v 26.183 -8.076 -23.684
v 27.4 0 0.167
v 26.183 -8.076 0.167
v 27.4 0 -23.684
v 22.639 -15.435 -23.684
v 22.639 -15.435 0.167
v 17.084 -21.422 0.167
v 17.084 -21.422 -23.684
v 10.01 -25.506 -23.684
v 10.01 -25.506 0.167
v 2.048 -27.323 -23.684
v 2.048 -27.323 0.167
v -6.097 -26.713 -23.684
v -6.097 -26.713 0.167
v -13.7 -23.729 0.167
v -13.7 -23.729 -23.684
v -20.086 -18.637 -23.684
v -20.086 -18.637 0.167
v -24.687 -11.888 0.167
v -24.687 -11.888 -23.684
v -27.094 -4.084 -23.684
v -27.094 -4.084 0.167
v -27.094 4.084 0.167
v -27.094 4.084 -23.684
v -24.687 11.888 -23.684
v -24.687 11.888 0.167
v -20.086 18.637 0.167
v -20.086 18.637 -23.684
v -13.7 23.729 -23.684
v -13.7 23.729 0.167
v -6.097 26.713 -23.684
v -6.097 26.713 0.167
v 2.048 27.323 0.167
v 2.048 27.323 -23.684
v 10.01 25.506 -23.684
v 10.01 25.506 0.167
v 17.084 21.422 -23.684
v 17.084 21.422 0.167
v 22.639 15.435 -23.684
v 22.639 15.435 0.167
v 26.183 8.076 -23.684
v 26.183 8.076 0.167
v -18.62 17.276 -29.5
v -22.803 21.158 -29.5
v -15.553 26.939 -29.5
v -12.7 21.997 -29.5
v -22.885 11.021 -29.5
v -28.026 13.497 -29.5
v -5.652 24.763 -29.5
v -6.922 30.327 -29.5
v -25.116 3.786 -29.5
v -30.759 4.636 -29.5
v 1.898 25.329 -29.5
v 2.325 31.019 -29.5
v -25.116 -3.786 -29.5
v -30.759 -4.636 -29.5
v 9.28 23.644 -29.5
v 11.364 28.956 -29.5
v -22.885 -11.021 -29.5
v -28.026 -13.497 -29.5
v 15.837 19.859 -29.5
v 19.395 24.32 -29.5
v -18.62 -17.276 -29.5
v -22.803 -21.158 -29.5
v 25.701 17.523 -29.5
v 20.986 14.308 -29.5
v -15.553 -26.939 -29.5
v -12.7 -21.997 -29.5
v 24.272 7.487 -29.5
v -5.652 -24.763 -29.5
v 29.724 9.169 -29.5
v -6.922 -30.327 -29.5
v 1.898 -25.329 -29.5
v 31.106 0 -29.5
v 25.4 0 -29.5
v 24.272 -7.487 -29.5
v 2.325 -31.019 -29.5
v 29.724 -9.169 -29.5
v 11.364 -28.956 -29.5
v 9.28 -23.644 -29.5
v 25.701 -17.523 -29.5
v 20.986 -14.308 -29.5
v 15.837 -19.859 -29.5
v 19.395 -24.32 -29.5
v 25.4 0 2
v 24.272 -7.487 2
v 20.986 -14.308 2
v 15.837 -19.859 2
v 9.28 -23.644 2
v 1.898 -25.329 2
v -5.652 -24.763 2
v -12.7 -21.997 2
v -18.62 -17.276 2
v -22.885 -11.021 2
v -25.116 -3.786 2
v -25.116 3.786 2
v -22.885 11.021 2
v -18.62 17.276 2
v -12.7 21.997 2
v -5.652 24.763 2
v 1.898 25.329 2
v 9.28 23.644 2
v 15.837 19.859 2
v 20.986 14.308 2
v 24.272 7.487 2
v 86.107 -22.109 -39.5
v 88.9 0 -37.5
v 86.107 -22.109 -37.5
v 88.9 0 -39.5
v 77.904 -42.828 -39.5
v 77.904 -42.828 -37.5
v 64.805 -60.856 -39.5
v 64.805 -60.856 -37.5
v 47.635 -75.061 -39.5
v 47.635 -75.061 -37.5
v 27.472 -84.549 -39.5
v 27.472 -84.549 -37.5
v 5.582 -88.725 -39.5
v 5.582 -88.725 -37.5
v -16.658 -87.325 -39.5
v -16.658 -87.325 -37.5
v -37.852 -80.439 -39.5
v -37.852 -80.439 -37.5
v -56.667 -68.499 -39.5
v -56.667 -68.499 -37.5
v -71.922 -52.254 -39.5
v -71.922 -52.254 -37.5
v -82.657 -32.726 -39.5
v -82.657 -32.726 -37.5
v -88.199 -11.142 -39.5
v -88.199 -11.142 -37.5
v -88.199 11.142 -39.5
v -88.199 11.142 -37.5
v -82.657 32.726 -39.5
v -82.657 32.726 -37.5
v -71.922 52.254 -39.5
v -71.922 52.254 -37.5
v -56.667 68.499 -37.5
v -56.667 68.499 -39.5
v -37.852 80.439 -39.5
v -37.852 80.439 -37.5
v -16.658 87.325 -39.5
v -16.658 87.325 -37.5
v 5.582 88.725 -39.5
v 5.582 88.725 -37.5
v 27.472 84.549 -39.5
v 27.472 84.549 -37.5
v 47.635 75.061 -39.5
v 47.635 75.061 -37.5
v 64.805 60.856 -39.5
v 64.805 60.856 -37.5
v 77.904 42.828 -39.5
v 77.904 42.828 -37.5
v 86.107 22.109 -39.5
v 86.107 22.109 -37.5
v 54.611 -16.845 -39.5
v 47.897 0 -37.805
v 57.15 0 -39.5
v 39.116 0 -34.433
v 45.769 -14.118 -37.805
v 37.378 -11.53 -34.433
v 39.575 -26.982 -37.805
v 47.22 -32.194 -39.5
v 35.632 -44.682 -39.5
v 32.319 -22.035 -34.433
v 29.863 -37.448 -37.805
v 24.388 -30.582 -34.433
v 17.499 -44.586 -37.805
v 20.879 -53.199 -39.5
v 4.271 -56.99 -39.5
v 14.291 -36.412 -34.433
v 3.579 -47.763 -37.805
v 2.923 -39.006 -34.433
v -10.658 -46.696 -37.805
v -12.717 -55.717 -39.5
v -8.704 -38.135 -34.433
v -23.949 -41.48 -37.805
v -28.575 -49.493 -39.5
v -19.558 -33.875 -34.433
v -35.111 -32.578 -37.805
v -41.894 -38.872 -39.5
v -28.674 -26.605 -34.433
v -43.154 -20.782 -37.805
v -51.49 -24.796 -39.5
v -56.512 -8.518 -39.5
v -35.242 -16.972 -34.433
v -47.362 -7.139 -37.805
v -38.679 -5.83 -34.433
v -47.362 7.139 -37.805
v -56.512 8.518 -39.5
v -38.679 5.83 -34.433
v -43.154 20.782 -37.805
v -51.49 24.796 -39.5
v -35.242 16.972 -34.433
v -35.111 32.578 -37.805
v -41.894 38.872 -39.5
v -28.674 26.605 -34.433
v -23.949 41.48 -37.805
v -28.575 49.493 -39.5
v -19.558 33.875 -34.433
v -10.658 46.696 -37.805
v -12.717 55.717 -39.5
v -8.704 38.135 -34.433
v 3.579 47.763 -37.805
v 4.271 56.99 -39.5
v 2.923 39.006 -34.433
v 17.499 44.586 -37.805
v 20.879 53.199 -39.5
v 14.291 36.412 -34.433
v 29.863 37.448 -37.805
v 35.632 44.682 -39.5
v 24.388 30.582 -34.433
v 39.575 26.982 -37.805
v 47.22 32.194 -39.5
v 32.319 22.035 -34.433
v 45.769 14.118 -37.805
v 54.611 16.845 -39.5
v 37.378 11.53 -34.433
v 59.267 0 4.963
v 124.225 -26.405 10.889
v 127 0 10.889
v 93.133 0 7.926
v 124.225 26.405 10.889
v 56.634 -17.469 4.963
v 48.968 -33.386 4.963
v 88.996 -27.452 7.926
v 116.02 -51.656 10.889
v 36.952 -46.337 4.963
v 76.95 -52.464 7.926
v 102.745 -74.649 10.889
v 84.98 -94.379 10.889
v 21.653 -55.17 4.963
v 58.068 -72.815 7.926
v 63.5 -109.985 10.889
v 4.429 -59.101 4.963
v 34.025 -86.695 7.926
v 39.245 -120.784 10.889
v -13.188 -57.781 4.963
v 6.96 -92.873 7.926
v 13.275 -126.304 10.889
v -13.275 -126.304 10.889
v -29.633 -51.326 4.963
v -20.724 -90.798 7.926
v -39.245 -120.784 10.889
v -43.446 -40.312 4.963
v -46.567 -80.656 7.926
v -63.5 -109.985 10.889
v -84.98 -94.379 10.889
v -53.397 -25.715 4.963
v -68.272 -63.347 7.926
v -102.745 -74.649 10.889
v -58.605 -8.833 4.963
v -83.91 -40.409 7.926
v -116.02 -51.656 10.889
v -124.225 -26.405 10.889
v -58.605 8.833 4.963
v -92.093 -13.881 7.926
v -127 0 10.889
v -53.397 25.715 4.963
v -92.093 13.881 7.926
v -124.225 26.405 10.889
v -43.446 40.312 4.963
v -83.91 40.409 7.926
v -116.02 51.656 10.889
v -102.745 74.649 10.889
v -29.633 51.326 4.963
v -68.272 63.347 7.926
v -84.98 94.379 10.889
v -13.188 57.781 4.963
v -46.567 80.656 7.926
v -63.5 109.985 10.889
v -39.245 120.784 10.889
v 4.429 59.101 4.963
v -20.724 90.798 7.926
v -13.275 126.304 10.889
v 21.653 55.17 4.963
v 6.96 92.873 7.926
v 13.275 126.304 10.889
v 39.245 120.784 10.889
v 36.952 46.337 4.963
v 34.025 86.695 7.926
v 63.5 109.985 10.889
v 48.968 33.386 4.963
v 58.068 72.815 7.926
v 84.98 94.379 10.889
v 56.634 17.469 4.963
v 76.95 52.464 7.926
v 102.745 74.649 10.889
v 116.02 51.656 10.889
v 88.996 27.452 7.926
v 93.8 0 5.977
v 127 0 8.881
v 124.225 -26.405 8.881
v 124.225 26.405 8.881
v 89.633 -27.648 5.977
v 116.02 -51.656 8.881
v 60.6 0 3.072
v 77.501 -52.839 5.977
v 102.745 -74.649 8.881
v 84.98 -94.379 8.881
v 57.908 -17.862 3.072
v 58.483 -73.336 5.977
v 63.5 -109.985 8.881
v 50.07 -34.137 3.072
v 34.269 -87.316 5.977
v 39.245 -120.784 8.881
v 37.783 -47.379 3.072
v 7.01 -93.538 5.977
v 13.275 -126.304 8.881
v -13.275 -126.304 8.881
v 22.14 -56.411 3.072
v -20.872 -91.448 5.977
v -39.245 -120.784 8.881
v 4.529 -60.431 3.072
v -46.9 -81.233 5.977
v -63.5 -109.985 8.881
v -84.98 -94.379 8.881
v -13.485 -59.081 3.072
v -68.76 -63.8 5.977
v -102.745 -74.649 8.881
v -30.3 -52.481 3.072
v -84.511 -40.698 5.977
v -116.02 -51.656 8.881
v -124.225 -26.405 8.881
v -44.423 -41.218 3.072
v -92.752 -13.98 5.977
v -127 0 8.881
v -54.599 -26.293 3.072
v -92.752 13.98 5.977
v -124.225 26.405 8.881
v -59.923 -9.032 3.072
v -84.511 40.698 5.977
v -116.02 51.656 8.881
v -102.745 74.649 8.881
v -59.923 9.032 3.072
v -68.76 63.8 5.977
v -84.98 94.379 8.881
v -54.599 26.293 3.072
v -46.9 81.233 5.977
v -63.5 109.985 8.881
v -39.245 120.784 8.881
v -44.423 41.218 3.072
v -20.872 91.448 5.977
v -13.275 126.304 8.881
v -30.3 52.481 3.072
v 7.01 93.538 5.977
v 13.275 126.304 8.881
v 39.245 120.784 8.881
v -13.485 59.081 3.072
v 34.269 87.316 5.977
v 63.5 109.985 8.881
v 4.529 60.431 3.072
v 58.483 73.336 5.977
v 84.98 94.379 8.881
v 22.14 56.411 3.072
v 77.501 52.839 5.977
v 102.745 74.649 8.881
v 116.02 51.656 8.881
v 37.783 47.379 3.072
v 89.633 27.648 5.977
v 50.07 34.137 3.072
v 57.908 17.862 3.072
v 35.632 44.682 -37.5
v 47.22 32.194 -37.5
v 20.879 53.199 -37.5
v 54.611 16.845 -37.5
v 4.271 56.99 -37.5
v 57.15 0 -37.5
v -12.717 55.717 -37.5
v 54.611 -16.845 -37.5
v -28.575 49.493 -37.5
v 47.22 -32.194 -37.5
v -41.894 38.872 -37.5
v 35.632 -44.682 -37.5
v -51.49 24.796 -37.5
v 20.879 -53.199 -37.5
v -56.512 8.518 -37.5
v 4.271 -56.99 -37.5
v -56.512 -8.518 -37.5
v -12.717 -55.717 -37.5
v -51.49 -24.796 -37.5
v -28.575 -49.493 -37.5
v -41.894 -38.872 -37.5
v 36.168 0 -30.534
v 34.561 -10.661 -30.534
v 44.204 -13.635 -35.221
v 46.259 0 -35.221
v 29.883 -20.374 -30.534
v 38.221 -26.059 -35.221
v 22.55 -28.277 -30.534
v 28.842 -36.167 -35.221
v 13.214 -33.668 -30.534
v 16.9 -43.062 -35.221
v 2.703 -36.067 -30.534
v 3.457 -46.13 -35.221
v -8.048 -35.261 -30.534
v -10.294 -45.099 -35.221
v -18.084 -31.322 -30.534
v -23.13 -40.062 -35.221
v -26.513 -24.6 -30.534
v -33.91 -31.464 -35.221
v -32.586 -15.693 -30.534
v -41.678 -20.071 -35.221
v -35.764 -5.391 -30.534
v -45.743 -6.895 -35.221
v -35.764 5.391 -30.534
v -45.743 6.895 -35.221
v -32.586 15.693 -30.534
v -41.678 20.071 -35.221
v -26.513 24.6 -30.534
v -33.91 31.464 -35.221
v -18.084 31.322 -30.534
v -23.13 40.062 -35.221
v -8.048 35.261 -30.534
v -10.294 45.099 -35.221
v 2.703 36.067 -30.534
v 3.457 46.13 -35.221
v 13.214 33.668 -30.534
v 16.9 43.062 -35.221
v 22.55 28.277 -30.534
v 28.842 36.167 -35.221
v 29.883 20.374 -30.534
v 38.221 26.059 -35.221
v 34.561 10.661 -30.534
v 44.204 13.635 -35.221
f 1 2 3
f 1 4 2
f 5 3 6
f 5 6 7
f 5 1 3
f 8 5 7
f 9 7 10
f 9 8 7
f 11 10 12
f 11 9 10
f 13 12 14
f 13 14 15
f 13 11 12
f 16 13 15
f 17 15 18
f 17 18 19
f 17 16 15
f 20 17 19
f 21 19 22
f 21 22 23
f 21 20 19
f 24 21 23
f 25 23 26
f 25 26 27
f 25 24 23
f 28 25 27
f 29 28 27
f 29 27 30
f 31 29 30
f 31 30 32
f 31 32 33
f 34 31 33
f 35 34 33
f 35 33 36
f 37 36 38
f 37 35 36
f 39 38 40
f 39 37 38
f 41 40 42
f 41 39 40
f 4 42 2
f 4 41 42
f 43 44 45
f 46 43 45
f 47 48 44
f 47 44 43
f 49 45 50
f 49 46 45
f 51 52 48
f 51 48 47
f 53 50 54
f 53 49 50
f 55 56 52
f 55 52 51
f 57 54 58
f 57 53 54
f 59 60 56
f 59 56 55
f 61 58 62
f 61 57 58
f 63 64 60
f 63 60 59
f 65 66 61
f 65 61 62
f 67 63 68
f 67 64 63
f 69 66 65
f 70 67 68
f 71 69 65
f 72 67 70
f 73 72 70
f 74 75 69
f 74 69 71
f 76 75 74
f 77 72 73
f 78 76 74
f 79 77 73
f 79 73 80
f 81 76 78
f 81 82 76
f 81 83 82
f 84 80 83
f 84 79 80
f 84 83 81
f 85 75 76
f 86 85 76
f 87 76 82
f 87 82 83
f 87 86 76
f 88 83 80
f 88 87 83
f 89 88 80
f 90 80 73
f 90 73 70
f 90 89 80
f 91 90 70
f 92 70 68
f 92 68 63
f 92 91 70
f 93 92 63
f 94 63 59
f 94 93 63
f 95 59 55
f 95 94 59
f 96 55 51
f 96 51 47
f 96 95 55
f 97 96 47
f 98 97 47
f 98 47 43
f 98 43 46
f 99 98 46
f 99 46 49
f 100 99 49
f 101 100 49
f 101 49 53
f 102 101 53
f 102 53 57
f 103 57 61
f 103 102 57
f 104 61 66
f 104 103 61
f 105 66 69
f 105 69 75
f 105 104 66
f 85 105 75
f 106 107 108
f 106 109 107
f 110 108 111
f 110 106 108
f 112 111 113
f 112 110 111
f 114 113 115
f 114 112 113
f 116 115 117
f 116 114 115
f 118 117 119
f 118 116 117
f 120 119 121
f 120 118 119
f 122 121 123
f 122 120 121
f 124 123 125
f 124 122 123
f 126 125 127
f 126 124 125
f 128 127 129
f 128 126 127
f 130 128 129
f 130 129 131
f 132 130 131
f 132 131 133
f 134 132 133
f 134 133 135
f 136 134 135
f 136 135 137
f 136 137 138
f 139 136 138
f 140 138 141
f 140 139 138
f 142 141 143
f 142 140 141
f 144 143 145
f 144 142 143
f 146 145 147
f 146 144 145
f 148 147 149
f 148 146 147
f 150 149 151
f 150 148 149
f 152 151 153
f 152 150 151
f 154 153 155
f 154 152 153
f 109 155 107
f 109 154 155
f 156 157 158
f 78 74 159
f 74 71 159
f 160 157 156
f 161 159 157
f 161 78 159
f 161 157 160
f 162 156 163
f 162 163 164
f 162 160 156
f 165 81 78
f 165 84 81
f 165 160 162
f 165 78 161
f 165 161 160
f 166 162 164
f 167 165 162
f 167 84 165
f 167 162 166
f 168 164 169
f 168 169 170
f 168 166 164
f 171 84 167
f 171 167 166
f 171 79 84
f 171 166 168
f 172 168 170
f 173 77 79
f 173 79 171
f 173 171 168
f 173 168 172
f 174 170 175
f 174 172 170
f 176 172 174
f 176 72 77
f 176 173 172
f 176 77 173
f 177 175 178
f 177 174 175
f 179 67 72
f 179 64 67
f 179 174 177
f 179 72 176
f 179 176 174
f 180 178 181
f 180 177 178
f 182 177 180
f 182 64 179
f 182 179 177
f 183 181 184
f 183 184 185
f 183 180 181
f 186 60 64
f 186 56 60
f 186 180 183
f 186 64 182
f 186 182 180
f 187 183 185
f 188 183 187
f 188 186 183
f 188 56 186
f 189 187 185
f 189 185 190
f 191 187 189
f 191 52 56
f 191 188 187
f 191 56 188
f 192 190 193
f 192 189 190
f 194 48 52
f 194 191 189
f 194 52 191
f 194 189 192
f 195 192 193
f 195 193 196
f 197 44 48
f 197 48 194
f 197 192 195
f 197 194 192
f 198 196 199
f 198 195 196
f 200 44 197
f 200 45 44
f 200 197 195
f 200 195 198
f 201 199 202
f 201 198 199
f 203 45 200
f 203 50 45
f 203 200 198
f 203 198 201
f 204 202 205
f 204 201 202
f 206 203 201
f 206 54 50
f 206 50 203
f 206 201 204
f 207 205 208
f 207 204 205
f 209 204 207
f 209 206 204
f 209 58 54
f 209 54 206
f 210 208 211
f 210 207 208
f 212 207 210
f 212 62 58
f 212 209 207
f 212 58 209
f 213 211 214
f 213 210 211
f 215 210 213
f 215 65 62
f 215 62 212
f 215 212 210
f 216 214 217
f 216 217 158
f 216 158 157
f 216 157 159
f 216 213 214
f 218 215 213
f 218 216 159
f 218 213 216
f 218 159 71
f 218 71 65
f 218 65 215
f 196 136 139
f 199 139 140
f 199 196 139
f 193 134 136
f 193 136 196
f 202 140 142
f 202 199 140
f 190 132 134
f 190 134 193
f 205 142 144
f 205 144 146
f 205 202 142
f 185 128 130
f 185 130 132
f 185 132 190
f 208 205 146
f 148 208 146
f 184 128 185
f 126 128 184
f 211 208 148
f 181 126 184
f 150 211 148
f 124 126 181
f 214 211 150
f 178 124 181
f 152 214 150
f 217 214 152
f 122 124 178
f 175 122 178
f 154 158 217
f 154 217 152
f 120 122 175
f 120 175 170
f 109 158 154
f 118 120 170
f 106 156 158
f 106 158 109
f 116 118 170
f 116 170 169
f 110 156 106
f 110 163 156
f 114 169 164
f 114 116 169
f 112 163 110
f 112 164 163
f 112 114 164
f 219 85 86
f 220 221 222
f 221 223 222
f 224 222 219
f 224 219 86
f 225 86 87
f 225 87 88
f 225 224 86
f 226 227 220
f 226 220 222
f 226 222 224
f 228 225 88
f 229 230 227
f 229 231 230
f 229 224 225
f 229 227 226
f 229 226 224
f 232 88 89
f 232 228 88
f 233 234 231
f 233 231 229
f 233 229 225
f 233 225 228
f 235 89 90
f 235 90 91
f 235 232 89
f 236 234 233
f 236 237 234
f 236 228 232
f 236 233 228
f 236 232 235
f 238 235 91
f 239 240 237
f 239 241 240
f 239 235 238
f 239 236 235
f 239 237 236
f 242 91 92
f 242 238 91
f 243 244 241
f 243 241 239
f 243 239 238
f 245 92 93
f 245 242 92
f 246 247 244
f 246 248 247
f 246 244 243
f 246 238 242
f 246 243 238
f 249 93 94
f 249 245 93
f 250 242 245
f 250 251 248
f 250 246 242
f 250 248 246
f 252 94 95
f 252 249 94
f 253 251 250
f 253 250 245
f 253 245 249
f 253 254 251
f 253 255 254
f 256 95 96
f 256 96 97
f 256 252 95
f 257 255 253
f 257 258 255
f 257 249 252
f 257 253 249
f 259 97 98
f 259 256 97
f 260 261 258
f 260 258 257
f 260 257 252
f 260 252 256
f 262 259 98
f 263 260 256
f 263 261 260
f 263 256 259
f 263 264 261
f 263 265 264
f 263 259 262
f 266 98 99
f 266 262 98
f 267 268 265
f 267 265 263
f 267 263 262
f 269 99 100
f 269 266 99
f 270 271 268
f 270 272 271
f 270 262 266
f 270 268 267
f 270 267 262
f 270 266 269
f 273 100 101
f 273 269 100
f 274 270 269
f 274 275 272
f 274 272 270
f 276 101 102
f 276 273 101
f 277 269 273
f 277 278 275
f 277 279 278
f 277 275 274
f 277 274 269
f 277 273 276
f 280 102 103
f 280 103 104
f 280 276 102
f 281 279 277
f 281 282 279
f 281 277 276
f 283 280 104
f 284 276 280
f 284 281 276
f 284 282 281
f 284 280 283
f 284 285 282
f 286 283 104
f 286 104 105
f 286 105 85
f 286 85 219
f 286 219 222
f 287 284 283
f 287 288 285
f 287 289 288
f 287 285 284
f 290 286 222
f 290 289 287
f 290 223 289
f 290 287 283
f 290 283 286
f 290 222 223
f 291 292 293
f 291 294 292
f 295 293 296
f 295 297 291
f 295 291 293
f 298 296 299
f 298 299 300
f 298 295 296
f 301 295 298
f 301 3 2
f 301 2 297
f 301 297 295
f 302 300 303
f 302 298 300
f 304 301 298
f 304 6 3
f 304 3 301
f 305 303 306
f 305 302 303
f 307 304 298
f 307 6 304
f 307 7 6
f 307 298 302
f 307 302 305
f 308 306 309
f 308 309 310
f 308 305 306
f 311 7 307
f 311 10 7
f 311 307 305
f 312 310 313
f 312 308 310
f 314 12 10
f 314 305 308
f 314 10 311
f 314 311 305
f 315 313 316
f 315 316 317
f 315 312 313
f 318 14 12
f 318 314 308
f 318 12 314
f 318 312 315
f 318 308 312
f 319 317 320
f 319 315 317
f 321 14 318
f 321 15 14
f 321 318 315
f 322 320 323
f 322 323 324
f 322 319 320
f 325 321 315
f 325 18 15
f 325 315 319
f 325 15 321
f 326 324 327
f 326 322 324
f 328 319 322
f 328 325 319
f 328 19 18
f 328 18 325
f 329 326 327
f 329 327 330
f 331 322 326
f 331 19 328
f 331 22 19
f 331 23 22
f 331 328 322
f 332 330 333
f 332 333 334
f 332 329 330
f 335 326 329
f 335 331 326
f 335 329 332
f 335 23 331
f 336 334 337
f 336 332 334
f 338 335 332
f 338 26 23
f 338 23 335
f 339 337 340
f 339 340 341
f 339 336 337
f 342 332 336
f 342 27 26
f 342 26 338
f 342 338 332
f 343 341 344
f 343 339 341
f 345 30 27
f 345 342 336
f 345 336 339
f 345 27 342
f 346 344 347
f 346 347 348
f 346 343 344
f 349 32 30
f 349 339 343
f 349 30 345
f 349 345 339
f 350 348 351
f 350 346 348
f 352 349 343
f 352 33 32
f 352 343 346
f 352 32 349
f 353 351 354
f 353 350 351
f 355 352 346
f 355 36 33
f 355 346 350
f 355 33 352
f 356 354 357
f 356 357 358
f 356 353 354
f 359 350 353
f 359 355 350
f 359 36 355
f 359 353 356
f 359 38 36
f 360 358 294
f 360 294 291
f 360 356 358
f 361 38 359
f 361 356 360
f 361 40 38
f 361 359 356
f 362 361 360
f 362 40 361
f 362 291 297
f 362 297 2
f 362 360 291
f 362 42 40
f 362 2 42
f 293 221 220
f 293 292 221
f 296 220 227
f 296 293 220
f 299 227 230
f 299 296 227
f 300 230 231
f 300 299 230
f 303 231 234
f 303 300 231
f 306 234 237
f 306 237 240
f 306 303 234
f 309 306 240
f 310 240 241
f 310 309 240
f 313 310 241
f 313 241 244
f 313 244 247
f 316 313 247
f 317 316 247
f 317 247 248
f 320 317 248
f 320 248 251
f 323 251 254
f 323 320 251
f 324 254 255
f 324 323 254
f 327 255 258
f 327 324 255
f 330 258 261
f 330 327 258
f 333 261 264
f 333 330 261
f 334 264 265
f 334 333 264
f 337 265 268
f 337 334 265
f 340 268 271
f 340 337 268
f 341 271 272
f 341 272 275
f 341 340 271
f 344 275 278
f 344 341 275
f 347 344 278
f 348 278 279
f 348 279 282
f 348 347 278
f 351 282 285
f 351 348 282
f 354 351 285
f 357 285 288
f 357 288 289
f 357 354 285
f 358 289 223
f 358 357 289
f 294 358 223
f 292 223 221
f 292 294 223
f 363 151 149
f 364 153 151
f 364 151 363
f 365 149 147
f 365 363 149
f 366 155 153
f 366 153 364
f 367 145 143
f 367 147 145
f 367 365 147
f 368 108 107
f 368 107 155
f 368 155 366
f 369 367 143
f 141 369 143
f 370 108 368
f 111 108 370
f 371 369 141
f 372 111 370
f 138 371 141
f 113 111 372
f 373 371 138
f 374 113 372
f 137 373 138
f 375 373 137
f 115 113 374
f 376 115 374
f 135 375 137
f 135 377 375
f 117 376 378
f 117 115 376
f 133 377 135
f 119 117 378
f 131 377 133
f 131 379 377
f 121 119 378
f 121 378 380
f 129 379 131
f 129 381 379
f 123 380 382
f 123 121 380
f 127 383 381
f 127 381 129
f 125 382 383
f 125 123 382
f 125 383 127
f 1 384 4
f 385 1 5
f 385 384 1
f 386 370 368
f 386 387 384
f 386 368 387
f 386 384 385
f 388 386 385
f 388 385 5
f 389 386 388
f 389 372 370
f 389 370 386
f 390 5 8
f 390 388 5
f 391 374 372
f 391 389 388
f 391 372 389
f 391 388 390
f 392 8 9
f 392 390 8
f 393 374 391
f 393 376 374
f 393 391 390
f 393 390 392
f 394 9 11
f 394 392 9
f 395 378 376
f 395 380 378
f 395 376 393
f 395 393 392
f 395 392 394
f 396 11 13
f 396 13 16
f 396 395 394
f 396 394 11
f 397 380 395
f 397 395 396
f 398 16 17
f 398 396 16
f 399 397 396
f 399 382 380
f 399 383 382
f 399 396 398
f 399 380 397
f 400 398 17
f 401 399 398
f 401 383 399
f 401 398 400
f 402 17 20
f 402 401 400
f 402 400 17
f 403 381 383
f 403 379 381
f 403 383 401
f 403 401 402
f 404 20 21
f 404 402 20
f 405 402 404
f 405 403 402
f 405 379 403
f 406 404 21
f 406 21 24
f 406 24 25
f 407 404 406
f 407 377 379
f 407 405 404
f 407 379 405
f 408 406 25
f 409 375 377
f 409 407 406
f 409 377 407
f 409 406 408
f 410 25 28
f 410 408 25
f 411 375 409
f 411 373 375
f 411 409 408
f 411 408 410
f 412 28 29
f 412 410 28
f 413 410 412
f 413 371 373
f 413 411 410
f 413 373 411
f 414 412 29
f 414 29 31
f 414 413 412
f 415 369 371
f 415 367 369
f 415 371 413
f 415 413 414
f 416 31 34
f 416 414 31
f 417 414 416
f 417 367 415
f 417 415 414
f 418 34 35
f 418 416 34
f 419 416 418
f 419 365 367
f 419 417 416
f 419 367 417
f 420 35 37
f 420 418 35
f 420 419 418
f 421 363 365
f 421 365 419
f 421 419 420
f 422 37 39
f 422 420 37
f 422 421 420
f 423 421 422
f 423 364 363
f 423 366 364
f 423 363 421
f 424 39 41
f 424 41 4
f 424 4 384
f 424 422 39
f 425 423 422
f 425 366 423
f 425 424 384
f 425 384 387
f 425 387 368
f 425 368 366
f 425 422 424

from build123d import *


with BuildPart() as part:
    # Sketch1 → Revolve1 (revolve)
    with BuildSketch(Plane.YZ, mode=Mode.PRIVATE) as revolve1_sk:
        with BuildLine():
            ThreePointArc((-57.15, -39.5), (-43.428307314, -36.322800112), (-31.106422396, -29.5))
            Line((-31.106422396, -29.5), (-25.4, -29.5))
            Line((-25.4, -29.5), (-25.4, 2))
            Line((-25.4, 2), (-127, 10.888848214))
            Line((-127, 10.888848214), (-127, 8.881208539))
            Line((-127, 8.881208539), (-27.4, 0.167337652))
            Line((-27.4, 0.167337652), (-27.4, -23.683734158))
            ThreePointArc((-27.4, -23.683734158), (-41.079585236, -33.165904784), (-57.15, -37.5))
            Line((-57.15, -37.5), (-88.9, -37.5))
            Line((-88.9, -37.5), (-88.9, -39.5))
            Line((-88.9, -39.5), (-57.15, -39.5))
        make_face()
    revolve(revolve1_sk.sketch.rotate(Axis((0, 0, 14.051954895), (0, 0, -1)), 270), axis=Axis((0, 0, 14.051954895), (0, 0, -1)))


solid = part.part
